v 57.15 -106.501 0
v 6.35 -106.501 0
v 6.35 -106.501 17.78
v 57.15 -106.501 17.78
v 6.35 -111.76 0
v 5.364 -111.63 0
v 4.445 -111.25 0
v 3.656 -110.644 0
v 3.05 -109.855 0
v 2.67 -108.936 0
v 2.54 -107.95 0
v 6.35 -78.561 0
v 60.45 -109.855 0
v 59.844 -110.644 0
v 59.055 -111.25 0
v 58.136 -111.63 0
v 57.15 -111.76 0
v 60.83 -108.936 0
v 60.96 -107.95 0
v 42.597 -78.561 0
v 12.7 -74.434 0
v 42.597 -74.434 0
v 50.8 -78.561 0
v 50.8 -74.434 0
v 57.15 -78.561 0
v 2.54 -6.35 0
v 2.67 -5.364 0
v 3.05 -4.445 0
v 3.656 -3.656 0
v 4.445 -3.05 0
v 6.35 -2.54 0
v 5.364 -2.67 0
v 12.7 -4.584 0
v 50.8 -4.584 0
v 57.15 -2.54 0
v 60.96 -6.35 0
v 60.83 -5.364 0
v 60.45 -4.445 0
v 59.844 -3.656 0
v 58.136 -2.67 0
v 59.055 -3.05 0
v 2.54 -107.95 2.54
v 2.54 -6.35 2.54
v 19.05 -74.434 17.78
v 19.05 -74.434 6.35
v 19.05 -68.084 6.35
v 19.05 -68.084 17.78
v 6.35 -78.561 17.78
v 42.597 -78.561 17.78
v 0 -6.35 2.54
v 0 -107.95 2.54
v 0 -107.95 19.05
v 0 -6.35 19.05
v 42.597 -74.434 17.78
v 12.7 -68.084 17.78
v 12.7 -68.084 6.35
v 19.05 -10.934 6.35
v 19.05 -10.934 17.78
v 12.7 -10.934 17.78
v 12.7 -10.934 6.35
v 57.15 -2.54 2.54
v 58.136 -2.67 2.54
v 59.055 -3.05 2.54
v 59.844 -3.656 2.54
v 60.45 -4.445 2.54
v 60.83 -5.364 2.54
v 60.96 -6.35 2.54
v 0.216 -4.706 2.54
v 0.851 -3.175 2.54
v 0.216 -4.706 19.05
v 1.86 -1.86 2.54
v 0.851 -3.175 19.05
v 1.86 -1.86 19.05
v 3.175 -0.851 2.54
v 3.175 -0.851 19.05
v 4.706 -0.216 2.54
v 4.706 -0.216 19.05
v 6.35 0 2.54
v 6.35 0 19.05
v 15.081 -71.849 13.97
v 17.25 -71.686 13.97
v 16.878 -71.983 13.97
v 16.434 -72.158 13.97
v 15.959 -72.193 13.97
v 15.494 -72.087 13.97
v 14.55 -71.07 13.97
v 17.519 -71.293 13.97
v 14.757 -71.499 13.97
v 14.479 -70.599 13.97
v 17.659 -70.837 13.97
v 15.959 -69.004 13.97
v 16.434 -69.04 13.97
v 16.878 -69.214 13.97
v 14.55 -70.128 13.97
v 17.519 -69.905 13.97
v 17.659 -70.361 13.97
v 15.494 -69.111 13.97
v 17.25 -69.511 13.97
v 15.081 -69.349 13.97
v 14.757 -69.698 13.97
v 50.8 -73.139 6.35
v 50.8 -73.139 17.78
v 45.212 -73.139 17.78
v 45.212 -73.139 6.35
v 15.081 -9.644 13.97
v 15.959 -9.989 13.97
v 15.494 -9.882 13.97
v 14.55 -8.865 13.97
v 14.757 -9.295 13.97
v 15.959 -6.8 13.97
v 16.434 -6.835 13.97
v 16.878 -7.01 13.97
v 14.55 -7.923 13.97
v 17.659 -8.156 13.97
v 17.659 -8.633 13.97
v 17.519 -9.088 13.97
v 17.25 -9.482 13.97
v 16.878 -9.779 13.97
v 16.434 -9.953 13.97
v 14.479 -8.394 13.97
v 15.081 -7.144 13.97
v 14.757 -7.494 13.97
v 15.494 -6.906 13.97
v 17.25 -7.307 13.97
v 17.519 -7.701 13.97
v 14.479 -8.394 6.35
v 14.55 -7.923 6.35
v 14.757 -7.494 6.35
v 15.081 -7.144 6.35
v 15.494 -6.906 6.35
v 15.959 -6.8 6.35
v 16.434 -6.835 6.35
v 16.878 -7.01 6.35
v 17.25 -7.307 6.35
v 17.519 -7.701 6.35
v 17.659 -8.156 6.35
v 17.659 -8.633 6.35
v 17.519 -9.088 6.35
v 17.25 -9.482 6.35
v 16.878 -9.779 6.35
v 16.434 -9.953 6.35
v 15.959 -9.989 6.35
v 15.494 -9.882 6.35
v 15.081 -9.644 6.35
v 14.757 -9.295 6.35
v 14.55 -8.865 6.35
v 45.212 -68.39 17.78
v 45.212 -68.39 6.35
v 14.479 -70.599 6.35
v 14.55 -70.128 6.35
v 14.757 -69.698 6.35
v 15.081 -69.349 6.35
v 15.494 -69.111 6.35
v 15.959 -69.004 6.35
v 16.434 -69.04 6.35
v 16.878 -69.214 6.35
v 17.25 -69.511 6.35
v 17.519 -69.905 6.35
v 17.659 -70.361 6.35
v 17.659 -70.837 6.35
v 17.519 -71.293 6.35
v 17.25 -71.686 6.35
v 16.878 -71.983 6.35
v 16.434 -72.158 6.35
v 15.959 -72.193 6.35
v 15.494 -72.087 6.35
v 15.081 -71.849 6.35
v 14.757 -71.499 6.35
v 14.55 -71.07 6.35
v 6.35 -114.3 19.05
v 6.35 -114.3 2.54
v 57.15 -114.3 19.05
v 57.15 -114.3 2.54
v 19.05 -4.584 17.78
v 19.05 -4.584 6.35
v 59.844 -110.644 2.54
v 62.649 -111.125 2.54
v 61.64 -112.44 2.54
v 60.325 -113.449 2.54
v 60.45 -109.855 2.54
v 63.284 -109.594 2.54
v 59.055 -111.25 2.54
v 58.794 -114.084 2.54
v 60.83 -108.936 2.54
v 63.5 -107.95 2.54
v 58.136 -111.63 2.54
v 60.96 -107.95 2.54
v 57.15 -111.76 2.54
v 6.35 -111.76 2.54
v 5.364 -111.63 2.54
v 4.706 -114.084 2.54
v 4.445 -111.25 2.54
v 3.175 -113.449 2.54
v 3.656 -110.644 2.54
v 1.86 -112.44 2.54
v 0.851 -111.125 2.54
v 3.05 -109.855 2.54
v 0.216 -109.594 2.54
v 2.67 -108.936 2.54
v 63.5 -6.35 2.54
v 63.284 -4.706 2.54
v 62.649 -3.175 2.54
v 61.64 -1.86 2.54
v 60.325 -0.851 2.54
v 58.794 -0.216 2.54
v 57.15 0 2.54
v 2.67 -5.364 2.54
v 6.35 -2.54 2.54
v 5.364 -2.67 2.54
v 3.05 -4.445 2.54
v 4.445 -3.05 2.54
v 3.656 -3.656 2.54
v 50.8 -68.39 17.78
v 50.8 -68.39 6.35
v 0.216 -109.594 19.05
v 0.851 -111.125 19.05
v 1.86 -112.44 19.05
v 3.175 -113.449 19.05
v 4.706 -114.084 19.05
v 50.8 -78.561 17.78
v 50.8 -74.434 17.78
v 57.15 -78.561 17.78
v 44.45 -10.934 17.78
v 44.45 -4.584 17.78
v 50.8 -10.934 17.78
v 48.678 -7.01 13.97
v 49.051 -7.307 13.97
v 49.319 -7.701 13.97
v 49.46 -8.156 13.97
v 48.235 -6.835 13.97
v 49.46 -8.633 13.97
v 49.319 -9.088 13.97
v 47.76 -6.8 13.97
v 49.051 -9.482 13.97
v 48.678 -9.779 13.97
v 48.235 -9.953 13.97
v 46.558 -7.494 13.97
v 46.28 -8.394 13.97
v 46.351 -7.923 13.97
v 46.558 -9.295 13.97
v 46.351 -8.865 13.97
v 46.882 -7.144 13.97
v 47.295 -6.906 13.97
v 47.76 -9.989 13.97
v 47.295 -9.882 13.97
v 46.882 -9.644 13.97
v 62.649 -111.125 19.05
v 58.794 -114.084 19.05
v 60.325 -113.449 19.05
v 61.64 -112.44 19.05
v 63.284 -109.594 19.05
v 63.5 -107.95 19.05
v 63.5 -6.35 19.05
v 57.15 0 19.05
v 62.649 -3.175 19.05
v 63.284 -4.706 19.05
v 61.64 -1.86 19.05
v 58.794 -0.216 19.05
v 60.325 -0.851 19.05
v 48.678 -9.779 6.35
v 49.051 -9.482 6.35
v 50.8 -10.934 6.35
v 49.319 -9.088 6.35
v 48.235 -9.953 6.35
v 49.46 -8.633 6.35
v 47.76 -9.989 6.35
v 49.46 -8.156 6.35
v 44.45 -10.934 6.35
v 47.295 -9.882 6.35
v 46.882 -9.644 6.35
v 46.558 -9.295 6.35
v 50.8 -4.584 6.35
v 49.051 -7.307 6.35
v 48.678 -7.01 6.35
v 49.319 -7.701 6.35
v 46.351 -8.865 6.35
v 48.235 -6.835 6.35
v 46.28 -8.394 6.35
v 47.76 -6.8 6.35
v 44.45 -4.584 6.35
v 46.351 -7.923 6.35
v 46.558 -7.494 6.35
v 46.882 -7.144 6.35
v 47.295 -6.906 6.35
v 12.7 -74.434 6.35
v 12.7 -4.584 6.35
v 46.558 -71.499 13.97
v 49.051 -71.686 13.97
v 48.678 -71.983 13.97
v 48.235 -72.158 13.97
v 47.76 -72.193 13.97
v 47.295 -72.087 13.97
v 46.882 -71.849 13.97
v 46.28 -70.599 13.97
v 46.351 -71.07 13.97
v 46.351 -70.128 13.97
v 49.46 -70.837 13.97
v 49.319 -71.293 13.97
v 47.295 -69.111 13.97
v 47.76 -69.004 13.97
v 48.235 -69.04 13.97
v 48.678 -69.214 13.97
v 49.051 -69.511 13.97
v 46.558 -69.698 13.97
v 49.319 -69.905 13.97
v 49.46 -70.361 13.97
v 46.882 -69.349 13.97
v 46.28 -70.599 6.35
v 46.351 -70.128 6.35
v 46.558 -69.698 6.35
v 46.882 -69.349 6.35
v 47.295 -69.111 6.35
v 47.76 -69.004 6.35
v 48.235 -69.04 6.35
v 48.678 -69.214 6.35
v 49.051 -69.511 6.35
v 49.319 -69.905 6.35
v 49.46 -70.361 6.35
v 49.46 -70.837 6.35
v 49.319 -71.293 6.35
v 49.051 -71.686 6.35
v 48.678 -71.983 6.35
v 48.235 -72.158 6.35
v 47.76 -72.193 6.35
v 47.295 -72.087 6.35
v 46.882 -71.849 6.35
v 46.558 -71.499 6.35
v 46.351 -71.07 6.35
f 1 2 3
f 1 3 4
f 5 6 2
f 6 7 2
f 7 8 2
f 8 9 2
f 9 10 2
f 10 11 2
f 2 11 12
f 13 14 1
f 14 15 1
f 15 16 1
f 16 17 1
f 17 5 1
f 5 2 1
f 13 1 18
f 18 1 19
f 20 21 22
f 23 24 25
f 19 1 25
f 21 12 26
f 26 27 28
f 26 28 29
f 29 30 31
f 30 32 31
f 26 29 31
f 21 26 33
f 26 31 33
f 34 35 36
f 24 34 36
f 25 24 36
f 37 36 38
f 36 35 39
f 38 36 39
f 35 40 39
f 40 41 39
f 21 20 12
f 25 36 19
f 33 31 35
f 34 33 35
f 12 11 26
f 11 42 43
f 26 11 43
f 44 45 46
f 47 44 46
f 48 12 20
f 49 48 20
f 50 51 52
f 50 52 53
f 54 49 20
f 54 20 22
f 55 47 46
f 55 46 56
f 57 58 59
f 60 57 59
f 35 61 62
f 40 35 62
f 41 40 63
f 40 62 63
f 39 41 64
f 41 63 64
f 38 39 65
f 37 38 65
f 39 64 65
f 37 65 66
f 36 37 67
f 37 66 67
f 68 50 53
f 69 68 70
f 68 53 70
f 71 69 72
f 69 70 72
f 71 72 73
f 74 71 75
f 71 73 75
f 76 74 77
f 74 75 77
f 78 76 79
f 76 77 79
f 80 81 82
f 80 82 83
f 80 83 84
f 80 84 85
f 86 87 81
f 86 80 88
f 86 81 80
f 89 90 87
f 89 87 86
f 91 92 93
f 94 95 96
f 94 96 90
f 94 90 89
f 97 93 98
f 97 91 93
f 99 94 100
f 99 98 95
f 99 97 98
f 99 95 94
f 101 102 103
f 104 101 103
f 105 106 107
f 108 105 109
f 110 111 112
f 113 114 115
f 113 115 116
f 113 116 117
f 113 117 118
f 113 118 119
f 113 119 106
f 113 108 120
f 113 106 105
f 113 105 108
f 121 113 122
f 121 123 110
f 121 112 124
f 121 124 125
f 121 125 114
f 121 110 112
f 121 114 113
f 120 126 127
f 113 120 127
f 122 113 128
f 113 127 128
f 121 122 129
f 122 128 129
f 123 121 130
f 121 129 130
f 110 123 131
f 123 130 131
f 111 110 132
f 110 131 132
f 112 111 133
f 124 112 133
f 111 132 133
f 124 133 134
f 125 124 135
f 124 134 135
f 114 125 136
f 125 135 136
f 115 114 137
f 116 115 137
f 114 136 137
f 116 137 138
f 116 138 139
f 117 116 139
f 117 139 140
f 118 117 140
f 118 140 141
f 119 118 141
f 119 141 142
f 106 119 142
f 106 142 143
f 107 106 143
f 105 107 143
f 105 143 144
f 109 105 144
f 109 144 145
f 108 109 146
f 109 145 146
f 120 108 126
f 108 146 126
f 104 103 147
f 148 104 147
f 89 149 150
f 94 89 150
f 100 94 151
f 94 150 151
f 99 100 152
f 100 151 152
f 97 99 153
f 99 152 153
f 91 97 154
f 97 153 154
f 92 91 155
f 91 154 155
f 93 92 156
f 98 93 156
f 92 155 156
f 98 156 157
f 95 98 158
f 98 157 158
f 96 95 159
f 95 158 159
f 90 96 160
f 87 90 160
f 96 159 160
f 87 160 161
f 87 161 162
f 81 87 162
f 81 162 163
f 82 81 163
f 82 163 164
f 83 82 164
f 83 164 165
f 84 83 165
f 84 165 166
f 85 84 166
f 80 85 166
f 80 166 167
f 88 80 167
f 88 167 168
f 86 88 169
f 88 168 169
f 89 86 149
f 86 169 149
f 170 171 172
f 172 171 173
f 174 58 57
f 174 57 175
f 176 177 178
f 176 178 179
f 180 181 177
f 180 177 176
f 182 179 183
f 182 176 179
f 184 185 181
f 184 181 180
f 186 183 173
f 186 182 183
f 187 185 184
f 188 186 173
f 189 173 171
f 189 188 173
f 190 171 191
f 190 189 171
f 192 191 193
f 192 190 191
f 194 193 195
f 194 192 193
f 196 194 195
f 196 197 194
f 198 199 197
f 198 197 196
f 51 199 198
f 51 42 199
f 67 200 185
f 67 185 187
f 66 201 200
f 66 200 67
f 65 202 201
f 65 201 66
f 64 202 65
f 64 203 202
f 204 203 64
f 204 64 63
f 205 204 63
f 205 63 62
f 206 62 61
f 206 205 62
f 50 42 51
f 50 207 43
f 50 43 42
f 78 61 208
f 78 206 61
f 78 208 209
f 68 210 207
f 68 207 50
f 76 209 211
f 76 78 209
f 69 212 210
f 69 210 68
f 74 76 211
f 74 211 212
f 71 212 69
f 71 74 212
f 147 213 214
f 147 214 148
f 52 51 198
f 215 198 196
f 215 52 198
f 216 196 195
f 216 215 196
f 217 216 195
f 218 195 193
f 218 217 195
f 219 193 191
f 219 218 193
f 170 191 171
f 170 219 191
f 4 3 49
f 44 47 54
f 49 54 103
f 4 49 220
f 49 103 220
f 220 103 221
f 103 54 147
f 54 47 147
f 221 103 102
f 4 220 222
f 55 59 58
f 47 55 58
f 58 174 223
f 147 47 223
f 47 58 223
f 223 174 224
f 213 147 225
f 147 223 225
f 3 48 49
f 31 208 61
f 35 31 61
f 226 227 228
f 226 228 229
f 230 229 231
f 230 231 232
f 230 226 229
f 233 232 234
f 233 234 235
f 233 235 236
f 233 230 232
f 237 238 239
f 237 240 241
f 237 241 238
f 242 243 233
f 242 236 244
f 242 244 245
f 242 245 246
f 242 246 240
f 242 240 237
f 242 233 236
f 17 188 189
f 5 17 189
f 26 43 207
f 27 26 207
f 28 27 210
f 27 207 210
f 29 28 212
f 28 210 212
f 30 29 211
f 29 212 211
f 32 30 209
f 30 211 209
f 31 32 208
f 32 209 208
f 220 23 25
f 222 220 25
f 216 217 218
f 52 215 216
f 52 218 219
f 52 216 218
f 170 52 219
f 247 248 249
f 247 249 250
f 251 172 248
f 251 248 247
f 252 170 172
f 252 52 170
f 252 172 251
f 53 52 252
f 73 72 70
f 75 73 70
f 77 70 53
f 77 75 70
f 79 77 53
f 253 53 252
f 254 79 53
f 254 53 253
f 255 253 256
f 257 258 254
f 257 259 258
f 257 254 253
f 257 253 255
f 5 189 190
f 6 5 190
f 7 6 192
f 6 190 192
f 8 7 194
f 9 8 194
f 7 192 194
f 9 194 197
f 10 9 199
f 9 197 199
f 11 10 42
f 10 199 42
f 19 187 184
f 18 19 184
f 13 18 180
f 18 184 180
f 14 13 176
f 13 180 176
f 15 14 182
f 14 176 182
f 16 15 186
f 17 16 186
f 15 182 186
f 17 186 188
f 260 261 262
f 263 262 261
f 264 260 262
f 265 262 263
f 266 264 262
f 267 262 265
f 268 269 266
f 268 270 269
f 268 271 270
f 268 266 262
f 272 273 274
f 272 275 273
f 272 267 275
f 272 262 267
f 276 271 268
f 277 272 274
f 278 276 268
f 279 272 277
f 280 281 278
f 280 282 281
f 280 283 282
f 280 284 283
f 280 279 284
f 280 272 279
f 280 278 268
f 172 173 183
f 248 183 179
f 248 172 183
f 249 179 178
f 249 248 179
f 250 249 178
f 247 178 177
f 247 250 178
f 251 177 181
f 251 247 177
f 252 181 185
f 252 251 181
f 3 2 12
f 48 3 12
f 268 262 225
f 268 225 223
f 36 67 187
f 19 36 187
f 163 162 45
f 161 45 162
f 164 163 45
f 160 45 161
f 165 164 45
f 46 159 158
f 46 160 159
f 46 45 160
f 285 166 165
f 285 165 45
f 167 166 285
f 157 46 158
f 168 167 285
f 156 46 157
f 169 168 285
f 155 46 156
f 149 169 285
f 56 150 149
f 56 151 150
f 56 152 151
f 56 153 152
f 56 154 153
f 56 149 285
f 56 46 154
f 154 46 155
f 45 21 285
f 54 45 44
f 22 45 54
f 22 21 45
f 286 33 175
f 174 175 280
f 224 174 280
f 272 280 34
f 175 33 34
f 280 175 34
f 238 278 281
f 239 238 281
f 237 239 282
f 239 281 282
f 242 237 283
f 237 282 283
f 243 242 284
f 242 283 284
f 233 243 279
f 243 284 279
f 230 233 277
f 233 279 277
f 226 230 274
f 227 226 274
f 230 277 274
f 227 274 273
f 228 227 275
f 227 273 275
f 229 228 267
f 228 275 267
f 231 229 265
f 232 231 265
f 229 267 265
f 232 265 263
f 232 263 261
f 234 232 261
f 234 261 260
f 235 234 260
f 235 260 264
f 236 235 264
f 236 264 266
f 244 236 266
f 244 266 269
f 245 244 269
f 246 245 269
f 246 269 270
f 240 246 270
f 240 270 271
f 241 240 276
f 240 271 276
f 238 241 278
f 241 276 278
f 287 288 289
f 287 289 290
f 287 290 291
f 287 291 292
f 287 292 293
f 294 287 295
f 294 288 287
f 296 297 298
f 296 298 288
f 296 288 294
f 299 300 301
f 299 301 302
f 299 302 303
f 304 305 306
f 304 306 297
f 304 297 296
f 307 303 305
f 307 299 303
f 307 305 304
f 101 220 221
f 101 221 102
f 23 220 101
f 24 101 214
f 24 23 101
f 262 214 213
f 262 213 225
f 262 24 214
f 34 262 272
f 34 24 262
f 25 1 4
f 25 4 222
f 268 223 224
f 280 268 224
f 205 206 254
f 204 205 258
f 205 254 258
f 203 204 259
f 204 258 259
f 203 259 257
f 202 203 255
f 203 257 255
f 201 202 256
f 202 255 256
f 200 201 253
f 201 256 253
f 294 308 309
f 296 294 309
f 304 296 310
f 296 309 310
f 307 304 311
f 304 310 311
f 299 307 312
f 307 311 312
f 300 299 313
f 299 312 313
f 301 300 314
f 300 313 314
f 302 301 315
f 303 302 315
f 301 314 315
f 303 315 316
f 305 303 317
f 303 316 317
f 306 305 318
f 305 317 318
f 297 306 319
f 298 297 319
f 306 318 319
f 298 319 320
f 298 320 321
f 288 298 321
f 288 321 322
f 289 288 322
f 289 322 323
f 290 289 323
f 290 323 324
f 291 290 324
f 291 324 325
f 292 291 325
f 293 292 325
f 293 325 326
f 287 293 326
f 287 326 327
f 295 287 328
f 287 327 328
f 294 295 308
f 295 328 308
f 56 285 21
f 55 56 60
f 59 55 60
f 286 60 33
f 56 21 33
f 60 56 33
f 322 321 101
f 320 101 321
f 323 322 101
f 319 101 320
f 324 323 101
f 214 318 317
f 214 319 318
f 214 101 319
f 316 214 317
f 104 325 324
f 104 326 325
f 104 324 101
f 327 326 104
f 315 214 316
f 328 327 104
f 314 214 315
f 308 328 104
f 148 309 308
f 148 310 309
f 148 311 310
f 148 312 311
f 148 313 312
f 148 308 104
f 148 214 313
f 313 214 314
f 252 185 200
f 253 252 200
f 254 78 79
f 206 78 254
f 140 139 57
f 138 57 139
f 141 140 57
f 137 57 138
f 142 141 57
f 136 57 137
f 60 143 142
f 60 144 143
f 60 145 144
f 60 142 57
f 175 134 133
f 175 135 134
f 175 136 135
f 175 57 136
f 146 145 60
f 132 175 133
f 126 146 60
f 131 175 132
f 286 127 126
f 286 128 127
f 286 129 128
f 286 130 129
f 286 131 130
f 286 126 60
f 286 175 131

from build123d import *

# Parameters (mm, degrees)
SKETCH1_W           = 63.5
SKETCH1_H           = 114.3
SKETCH1_W_2         = 38.1
SKETCH1_H_2         = 69.85
SKETCH1_W_3         = 50.8
SKETCH1_H_3         = 27.94
BOSS_EXTRUDE1_DEPTH = 19.05
SKETCH1_4_W         = 50.8
SKETCH1_4_H         = 27.94
CUT_EXTRUDE1_DEPTH  = 17.78
SKETCH3_W           = 8.203339587
SKETCH3_H           = 4.126489459
CUT_EXTRUDE2_DEPTH  = 17.78
SKETCH1_6_W         = 38.1
SKETCH1_6_H         = 69.85
CUT_EXTRUDE4_DEPTH  = 17.78
SKETCH7_W           = 5.588
SKETCH7_H           = 4.749156964
SKETCH7_W_2         = 6.35
SKETCH7_H_2         = 6.35
BOSS_EXTRUDE2_DEPTH = 11.43
CUT_EXTRUDE5_START  = 11.43
SKETCH6_R           = 1.598803
CUT_EXTRUDE5_DEPTH  = 7.62
FILLET2_R           = 6.35
CUT_EXTRUDE6_START  = -2.54
CUT_EXTRUDE6_DEPTH  = 2.54


with BuildPart() as part:
    # Sketch1 → Boss-Extrude1 (new body)
    # profile 1 of 3: a face of its own
    with BuildSketch(Plane.XY):
        with Locations((31.75, -57.15)):
            Rectangle(SKETCH1_W, SKETCH1_H)
        with Locations((31.75, -39.50921232)):
            Rectangle(SKETCH1_W_2, SKETCH1_H_2, mode=Mode.SUBTRACT)
        with Locations((31.75, -92.530701779)):
            Rectangle(SKETCH1_W_3, SKETCH1_H_3, mode=Mode.SUBTRACT)
    # profile 2 of 3: a face of its own
    with BuildSketch(Plane.XY):
        with Locations((31.75, -39.50921232)):
            Rectangle(SKETCH1_W_2, SKETCH1_H_2)
    # profile 3 of 3: a face of its own
    with BuildSketch(Plane.XY):
        with Locations((31.75, -92.530701779)):
            Rectangle(SKETCH1_W_3, SKETCH1_H_3)
    extrude(amount=BOSS_EXTRUDE1_DEPTH)

    # Sketch1<4> → Cut-Extrude1 (cut)
    with BuildSketch(Plane.XY):
        with Locations((31.75, -92.530701779)):
            Rectangle(SKETCH1_4_W, SKETCH1_4_H)
    extrude(amount=CUT_EXTRUDE1_DEPTH, mode=Mode.SUBTRACT)

    # Sketch3 → Cut-Extrude2 (cut)
    with BuildSketch(Plane(origin=(0, 0, 0), x_dir=(-1, 0, 0), z_dir=(0, 0, -1))):
        with Locations((-46.698330207, -76.497457049)):
            Rectangle(SKETCH3_W, SKETCH3_H)
    extrude(amount=-CUT_EXTRUDE2_DEPTH, mode=Mode.SUBTRACT)

    # Sketch1<6> → Cut-Extrude4 (cut)
    with BuildSketch(Plane.XY):
        with Locations((31.75, -39.50921232)):
            Rectangle(SKETCH1_6_W, SKETCH1_6_H)
    extrude(amount=CUT_EXTRUDE4_DEPTH, mode=Mode.SUBTRACT)

    # Sketch7 → Boss-Extrude2 (add)
    with BuildSketch(Plane(origin=(0, 0, 17.78), x_dir=(-1, 0, 0), z_dir=(0, 0, -1))):
        with Locations((-48.006, -70.764233838)):
            Rectangle(SKETCH7_W, SKETCH7_H)
        with Locations((-15.875, -71.25921232)):
            Rectangle(SKETCH7_W_2, SKETCH7_H_2)
        with Locations((-15.875, -7.75921232)):
            Rectangle(SKETCH7_W_2, SKETCH7_H_2)
        with Locations((-47.625, -7.75921232)):
            Rectangle(SKETCH7_W_2, SKETCH7_H_2)
    extrude(amount=BOSS_EXTRUDE2_DEPTH)

    # Sketch6 → Cut-Extrude5 (cut)
    with BuildSketch(Plane(origin=(0, 0, 17.78), x_dir=(-1, 0, 0), z_dir=(0, 0, -1)).offset(CUT_EXTRUDE5_START)):
        with Locations((-47.879, -70.59881232)):
            Circle(SKETCH6_R)
        with Locations((-16.0782, -70.59881232)):
            Circle(SKETCH6_R)
        with Locations((-47.879, -8.39421232)):
            Circle(SKETCH6_R)
        with Locations((-16.0782, -8.39421232)):
            Circle(SKETCH6_R)
    extrude(amount=-CUT_EXTRUDE5_DEPTH, mode=Mode.SUBTRACT)

    # Fillet2
    fillet2_edges = [part.edges().sort_by_distance(p)[0] for p in [
        (63.5, -114.3, 9.525),
        (0, -114.3, 9.525),
        (0, 0, 9.525),
        (63.5, 0, 9.525),
    ]]
    fillet(fillet2_edges, radius=FILLET2_R)

    # Sketch9 → Cut-Extrude6 (cut)
    with BuildSketch(Plane(origin=(0, 0, 0), x_dir=(-1, 0, 0), z_dir=(0, 0, -1)).offset(CUT_EXTRUDE6_START)):
        with BuildLine():
            ThreePointArc((-6.35, -114.3), (-1.859871939, -112.440128061), (0, -107.95))
            Line((0, -107.95), (0, -6.35))
            ThreePointArc((0, -6.35), (-1.859871939, -1.859871939), (-6.35, 0))
            Line((-6.35, 0), (-57.15, 0))
            ThreePointArc((-57.15, 0), (-61.640128061, -1.859871939), (-63.5, -6.35))
            Line((-63.5, -6.35), (-63.5, -107.95))
            ThreePointArc((-63.5, -107.95), (-61.640128061, -112.440128061), (-57.15, -114.3))
            Line((-57.15, -114.3), (-6.35, -114.3))
        make_face()
        with BuildLine():
            ThreePointArc((-60.96, -107.95), (-59.844076836, -110.644076836), (-57.15, -111.76))
            Line((-57.15, -111.76), (-6.35, -111.76))
            ThreePointArc((-6.35, -111.76), (-3.655923164, -110.644076836), (-2.54, -107.95))
            Line((-2.54, -107.95), (-2.54, -6.35))
            ThreePointArc((-2.54, -6.35), (-3.655923164, -3.655923164), (-6.35, -2.54))
            Line((-6.35, -2.54), (-57.15, -2.54))
            ThreePointArc((-57.15, -2.54), (-59.844076836, -3.655923164), (-60.96, -6.35))
            Line((-60.96, -6.35), (-60.96, -107.95))
        make_face(mode=Mode.SUBTRACT)
    extrude(amount=CUT_EXTRUDE6_DEPTH, mode=Mode.SUBTRACT)


solid = part.part
